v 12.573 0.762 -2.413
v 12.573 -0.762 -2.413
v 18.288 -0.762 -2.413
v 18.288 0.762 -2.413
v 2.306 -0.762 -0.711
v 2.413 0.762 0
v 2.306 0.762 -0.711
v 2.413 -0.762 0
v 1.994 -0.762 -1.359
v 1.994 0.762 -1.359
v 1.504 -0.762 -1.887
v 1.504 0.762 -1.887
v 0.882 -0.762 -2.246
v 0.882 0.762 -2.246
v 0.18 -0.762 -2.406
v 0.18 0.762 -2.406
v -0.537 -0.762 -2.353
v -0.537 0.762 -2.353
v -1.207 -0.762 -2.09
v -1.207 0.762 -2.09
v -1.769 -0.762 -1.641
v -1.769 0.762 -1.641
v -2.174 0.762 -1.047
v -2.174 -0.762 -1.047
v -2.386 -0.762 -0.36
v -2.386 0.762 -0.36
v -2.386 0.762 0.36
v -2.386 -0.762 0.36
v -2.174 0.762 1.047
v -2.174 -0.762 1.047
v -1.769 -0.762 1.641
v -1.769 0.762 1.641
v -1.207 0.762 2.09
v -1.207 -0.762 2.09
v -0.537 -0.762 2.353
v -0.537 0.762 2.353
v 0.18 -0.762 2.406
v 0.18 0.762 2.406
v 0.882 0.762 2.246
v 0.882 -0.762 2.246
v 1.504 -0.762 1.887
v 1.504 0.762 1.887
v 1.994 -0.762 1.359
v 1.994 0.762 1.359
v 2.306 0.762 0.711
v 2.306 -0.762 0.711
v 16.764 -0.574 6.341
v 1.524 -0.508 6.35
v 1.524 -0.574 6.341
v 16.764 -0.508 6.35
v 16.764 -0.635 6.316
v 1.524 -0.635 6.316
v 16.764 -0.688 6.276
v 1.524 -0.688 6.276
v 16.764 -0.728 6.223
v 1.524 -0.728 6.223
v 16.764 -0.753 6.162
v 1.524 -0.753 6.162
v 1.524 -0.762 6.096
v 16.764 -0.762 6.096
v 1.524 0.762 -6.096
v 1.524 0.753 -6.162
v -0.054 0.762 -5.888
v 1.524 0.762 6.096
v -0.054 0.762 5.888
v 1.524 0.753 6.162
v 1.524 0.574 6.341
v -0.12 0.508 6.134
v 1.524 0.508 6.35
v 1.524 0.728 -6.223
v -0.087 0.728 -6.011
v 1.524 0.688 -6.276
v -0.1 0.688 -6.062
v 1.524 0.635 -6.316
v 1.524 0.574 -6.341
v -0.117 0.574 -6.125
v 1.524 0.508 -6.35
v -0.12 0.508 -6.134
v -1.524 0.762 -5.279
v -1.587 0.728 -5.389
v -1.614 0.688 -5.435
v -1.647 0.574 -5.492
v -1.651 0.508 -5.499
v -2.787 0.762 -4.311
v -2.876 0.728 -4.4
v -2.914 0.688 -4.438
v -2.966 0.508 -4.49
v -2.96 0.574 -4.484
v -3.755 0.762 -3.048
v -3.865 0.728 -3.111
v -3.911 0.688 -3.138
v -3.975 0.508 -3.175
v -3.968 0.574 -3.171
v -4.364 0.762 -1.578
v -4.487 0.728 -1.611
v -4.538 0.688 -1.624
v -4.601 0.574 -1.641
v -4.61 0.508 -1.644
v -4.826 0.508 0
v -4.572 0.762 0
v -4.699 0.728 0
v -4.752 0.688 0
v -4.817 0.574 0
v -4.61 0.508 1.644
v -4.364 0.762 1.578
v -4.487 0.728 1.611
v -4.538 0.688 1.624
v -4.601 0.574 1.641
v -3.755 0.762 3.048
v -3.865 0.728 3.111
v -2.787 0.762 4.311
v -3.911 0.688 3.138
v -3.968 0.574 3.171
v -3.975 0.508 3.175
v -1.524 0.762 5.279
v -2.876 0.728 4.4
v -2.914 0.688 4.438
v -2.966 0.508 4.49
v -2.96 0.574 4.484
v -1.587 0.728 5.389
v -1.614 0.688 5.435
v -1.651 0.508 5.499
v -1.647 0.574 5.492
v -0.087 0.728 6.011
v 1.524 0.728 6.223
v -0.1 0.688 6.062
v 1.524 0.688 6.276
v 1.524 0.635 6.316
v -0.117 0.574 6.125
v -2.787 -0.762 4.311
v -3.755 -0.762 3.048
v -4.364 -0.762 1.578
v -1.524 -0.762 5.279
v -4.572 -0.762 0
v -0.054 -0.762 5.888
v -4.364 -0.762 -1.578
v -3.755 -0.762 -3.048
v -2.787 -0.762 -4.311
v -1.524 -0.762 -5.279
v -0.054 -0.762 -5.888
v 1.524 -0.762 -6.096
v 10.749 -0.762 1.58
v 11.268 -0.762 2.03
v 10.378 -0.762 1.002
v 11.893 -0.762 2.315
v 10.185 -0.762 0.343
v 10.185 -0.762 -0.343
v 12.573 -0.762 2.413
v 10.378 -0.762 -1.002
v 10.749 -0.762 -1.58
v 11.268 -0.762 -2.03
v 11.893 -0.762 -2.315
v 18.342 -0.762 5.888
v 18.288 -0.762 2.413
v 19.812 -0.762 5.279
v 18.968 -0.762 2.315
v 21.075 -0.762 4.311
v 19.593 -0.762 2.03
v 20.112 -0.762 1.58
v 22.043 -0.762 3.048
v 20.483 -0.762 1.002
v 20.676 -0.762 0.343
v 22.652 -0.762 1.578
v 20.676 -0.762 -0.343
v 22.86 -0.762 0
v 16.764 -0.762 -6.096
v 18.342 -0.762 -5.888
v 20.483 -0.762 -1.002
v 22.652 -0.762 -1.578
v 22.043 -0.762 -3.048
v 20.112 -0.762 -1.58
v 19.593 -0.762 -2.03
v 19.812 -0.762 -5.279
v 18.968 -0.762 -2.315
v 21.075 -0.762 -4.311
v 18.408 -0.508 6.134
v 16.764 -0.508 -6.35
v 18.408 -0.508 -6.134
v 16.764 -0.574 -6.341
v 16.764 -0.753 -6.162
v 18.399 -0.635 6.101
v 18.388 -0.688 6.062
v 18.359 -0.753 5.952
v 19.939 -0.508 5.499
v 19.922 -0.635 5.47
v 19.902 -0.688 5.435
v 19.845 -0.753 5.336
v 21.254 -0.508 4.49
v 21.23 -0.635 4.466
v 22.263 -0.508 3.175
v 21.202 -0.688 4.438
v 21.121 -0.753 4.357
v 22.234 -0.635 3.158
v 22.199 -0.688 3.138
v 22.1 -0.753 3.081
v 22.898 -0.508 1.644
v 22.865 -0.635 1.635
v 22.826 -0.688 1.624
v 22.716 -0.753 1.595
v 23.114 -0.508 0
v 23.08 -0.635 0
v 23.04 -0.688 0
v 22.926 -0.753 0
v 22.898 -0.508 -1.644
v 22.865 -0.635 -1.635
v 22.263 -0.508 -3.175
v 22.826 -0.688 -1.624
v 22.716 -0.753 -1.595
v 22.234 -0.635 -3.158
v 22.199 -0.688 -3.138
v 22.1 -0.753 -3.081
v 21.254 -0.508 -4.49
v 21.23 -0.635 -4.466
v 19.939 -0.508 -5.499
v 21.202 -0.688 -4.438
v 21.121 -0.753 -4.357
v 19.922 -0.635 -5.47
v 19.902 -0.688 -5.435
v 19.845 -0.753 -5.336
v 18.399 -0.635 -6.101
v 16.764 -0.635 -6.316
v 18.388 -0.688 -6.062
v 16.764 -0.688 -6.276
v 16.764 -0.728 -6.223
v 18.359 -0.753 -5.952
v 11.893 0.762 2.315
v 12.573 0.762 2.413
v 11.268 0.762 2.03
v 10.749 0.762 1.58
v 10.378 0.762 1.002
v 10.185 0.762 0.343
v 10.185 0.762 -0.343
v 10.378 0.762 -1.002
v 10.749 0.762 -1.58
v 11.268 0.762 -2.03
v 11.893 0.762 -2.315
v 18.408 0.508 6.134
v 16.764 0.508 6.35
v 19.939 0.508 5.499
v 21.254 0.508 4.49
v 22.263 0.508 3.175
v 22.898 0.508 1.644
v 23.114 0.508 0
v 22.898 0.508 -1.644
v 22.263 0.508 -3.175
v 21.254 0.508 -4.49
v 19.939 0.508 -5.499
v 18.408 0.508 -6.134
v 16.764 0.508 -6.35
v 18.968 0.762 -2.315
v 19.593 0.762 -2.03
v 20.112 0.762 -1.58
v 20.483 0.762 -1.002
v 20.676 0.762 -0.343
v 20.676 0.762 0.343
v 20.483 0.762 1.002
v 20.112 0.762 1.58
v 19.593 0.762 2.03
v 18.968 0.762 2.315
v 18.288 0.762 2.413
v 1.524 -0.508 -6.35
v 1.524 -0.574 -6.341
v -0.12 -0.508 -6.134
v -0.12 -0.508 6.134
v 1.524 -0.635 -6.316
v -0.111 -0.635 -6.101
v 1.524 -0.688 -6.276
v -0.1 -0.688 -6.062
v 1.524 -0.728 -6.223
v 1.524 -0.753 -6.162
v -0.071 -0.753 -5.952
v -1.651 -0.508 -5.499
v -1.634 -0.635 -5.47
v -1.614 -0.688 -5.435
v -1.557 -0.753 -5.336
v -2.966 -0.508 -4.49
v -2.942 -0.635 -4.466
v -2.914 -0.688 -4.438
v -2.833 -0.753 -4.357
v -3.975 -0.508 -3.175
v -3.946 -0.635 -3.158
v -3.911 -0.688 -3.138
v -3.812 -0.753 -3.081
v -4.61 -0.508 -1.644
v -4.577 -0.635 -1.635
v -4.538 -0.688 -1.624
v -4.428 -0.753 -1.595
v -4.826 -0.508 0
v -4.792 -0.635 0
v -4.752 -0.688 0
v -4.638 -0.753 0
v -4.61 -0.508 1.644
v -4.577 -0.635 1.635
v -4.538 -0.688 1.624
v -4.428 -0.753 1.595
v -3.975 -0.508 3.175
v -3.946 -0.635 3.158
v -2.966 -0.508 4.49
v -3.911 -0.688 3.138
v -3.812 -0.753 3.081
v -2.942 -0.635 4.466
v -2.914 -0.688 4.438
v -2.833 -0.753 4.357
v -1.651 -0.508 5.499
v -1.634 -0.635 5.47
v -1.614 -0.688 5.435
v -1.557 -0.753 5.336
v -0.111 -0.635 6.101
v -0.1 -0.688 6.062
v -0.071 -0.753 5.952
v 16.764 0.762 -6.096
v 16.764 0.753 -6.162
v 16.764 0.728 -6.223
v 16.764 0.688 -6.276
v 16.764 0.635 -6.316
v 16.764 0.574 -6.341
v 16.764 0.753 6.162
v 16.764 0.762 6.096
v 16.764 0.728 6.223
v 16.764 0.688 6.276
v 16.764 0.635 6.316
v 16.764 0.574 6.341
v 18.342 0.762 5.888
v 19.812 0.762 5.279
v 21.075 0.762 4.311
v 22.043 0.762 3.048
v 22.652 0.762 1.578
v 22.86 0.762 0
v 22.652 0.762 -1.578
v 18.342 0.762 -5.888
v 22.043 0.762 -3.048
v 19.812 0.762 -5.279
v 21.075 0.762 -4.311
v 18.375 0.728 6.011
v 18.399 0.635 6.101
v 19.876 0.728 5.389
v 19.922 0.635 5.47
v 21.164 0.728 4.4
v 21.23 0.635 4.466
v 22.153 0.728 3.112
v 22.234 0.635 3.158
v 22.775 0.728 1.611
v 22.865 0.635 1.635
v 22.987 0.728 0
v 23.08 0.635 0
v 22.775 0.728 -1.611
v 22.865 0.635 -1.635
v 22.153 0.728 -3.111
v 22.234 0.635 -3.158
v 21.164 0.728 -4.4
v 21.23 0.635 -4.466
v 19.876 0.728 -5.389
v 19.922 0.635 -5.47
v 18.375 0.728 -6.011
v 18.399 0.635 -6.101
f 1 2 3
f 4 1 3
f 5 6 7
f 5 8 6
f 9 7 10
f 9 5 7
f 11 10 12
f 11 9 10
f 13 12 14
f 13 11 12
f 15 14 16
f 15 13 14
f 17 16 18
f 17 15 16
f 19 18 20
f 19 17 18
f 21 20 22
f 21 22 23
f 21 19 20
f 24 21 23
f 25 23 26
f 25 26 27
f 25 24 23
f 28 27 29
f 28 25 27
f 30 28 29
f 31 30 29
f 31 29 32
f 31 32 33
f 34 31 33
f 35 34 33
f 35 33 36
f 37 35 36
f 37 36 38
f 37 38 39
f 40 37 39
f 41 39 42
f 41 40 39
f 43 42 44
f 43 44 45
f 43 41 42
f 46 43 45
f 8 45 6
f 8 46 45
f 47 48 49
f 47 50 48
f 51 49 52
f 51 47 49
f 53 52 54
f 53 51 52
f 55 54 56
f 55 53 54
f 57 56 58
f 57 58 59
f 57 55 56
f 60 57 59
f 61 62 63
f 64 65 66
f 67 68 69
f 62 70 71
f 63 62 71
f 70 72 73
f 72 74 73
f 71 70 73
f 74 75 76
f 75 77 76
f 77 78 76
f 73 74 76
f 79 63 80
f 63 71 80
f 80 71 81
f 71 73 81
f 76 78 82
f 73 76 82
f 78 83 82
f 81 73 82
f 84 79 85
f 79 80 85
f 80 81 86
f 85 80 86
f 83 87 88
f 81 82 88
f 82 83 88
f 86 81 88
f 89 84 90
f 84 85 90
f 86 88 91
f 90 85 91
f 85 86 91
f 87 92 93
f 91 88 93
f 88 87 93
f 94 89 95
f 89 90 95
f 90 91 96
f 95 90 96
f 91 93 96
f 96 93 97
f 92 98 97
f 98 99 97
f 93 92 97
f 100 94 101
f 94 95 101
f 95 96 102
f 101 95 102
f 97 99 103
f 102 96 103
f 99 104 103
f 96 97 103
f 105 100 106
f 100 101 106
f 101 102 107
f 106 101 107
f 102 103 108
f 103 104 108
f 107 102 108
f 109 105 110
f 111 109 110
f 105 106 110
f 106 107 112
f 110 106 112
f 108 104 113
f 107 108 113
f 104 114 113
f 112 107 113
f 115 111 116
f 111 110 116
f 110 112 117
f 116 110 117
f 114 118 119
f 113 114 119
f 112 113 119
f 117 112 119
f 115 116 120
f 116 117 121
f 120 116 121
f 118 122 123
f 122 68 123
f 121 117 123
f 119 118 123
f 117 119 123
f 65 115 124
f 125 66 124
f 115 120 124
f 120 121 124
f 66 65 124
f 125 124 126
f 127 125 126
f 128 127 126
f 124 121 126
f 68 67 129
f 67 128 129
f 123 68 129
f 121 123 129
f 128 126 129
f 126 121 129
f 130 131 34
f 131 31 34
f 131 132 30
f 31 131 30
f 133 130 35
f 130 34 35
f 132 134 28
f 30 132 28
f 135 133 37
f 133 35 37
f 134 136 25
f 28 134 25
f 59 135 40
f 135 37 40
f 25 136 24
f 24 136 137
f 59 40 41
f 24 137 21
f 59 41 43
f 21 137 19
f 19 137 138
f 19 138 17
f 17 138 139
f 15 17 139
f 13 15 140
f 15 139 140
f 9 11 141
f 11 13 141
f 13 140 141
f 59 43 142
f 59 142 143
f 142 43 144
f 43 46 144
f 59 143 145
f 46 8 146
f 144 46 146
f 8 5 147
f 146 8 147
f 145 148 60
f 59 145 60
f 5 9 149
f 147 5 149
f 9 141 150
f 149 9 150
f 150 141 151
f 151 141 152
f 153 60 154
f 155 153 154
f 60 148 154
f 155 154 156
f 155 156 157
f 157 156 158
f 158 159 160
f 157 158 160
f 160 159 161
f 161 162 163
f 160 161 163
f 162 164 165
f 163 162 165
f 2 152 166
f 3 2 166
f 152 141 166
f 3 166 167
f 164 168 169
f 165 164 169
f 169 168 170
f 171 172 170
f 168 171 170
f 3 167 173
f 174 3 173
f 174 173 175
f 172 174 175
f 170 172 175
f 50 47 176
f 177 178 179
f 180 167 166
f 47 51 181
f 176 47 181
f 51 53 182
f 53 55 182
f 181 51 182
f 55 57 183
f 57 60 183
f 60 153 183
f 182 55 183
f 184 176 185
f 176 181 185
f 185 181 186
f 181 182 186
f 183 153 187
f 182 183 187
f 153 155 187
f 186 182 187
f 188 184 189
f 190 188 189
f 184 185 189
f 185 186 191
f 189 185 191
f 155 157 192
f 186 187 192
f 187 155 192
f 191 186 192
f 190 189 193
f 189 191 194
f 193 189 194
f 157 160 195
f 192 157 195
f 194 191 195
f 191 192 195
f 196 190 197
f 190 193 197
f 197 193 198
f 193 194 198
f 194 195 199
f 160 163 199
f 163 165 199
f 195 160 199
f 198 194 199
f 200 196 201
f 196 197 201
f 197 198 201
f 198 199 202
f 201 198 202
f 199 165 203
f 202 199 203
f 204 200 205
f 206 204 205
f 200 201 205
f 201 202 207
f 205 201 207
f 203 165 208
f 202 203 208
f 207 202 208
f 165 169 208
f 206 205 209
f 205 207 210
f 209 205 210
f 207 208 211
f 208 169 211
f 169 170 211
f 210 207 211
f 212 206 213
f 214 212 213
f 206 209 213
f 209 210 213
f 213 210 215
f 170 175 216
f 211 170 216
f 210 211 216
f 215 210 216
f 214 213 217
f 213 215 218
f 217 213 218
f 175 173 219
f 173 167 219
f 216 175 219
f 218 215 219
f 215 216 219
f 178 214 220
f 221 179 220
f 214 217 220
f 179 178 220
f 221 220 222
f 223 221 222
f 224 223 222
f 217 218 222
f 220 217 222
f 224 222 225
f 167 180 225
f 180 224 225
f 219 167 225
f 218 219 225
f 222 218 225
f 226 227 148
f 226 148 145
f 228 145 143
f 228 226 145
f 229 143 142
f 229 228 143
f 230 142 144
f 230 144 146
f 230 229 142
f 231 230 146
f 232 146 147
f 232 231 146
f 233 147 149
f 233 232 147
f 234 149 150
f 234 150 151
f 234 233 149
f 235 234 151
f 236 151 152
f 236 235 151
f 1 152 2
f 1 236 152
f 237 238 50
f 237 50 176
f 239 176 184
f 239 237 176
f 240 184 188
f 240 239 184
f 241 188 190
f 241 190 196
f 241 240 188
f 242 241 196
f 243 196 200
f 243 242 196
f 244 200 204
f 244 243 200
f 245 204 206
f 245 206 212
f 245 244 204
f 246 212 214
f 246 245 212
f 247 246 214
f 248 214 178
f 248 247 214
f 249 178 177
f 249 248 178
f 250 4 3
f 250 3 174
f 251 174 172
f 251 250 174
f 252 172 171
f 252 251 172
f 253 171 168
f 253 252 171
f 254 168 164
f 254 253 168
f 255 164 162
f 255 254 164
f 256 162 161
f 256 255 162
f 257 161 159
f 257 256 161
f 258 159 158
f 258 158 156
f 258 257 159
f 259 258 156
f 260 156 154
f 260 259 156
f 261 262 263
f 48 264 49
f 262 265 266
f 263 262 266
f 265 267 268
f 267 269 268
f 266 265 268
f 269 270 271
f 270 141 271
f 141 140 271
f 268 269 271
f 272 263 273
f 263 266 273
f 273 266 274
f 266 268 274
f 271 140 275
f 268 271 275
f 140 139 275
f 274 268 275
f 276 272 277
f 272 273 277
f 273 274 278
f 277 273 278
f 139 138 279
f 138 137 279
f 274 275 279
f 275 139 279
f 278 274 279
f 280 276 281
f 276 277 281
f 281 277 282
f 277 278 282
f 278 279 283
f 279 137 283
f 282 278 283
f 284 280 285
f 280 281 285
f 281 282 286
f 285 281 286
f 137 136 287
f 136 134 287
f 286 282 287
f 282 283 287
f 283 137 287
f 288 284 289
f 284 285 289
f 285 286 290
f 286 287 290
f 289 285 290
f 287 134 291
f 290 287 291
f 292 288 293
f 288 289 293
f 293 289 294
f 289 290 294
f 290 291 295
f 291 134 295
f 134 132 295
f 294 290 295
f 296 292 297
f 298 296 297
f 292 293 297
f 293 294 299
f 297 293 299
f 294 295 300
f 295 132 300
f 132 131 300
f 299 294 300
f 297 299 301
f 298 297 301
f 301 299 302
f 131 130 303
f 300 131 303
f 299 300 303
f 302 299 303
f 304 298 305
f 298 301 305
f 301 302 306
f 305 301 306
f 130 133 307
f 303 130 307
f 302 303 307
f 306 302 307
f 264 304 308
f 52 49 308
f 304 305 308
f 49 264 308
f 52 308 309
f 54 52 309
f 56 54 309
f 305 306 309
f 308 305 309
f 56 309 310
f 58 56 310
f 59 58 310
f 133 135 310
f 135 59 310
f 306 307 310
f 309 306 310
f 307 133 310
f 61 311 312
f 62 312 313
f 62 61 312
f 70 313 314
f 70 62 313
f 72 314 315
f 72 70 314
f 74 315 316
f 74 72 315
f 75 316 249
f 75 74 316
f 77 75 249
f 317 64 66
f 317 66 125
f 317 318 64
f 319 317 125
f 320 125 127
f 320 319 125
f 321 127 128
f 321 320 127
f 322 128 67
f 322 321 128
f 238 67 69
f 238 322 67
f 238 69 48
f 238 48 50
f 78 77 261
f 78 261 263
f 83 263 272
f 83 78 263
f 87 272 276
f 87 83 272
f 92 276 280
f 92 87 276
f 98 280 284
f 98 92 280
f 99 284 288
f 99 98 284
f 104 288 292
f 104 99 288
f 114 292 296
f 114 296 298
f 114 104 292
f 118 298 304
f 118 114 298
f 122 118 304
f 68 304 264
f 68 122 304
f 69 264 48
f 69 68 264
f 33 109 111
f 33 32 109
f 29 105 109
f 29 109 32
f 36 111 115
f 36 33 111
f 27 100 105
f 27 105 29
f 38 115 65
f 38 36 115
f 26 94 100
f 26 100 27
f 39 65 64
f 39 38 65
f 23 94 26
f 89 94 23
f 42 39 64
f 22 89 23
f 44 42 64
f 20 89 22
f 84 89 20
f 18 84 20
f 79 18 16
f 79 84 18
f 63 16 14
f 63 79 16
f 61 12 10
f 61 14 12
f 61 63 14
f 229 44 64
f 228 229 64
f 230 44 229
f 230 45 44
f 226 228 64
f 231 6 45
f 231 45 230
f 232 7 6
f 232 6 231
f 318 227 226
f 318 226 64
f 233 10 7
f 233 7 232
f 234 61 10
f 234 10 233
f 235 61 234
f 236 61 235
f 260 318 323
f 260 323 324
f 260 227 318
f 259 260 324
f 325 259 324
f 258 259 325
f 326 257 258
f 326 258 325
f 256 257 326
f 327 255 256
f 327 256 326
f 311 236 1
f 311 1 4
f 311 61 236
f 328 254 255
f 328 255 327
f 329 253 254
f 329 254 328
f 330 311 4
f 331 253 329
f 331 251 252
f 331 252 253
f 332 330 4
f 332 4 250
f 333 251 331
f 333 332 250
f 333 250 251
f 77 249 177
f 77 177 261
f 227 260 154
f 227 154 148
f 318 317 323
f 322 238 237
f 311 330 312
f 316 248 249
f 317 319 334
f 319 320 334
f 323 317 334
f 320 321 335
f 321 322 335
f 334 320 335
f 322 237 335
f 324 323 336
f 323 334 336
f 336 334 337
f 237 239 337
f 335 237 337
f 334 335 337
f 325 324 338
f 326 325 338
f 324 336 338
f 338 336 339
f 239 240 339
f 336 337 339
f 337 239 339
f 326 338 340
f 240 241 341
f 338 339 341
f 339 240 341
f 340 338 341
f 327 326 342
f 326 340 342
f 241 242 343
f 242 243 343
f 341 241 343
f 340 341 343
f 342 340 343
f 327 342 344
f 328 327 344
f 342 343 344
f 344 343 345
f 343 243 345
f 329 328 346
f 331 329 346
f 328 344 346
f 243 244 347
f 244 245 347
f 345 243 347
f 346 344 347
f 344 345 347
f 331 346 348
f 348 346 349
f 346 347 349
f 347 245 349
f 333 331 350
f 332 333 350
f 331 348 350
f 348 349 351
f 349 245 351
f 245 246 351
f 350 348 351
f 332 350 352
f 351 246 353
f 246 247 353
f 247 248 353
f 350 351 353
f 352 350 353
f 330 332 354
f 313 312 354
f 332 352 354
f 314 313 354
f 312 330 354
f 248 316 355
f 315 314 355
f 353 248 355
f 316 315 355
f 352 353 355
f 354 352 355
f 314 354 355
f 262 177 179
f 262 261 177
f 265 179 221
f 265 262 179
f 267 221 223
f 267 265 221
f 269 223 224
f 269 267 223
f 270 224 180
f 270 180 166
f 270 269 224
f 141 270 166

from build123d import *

# Parameters (mm, degrees)
SKETCH1_R      = 2.413
EXTRUDE1_DEPTH = 0.762
FILLET1_R      = 0.254


with BuildPart() as part:
    # Sketch1 → Extrude1 (new body, symmetric)
    with BuildSketch(Plane(origin=(0, 0, 0), x_dir=(1, 0, 0), z_dir=(0, 1, 0))):
        with BuildLine():
            Line((1.524, -6.35), (16.764, -6.35))
            ThreePointArc((16.764, -6.35), (23.114, 0), (16.764, 6.35))
            Line((16.764, 6.35), (1.524, 6.35))
            ThreePointArc((1.524, 6.35), (-4.826, 0), (1.524, -6.35))
        make_face()
        Circle(SKETCH1_R, mode=Mode.SUBTRACT)
        with BuildLine():
            Line((12.573, 2.413), (18.288, 2.413))
            ThreePointArc((18.288, 2.413), (20.701, 0), (18.288, -2.413))
            Line((18.288, -2.413), (12.573, -2.413))
            ThreePointArc((12.573, -2.413), (10.16, 0), (12.573, 2.413))
        make_face(mode=Mode.SUBTRACT)
    extrude(amount=EXTRUDE1_DEPTH, both=True)

    # Fillet1
    fillet1_edges = [part.edges().sort_by_distance(p)[0] for p in [
        (23.114, 0.762, 0),
        (9.144, 0.762, -6.35),
        (-4.826, 0.762, 0),
        (9.144, -0.762, -6.35),
        (23.114, -0.762, 0),
        (9.144, -0.762, 6.35),
        (-4.826, -0.762, 0),
        (9.144, 0.762, 6.35),
    ]]
    fillet(fillet1_edges, radius=FILLET1_R)


solid = part.part
